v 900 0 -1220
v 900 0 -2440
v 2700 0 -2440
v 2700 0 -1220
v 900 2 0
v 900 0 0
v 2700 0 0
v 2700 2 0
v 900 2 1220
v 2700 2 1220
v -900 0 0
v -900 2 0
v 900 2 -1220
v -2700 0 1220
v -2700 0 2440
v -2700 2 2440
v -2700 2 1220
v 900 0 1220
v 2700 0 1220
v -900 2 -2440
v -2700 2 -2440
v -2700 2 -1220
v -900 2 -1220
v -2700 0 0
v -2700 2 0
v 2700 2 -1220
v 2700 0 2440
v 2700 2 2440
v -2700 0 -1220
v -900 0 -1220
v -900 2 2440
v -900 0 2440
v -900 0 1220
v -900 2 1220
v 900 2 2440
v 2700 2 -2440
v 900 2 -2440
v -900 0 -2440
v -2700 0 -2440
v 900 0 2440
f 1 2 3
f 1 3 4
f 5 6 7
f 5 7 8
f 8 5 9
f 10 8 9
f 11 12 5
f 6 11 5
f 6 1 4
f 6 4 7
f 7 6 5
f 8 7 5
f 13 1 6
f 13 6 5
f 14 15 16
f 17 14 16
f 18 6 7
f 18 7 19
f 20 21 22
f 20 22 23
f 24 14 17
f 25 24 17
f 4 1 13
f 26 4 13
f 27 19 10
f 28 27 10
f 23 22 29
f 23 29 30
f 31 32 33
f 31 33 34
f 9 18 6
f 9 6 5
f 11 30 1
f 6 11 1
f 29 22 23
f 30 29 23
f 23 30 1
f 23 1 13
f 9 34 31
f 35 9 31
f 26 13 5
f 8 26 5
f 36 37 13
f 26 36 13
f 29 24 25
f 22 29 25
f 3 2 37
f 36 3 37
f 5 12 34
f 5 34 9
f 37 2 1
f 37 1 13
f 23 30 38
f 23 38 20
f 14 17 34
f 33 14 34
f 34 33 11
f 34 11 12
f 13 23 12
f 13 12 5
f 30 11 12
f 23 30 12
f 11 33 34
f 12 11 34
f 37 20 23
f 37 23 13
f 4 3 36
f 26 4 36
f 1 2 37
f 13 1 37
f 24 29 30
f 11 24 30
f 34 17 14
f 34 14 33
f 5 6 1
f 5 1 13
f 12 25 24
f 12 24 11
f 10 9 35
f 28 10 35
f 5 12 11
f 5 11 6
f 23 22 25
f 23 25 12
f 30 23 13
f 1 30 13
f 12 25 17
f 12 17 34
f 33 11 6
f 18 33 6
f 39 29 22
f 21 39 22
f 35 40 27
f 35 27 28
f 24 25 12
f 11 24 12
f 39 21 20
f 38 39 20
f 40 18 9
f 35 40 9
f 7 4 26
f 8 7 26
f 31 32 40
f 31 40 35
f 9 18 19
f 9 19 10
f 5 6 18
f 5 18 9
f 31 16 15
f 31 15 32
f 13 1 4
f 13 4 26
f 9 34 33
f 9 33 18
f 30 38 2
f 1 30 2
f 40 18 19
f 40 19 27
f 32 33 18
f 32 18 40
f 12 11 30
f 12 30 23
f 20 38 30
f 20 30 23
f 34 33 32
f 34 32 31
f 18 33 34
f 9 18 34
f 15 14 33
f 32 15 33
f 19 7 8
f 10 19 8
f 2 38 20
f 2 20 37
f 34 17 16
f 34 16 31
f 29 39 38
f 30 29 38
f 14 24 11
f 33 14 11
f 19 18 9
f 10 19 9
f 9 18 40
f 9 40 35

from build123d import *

# Parameters (mm, degrees)
SKETCH1_W           = 5400
SKETCH1_H           = 4880
BOSS_EXTRUDE1_DEPTH = 2
SPLIT1_START        = 900
SPLIT1_OUTLINE_W    = 2
SPLIT1_OUTLINE_H    = 1220
SPLIT1_DEPTH        = 1800
SPLIT1_2_OUTLINE_W  = 2
SPLIT1_2_OUTLINE_H  = 1220
SPLIT1_2_DEPTH      = 1800
SPLIT1_3_OUTLINE_W  = 2
SPLIT1_3_OUTLINE_H  = 1220
SPLIT1_3_DEPTH      = 1800
SPLIT1_START_2      = 1220
SPLIT1_4_OUTLINE_W  = 1800
SPLIT1_4_OUTLINE_H  = 2
SPLIT1_4_DEPTH      = 1220
SPLIT1_5_OUTLINE_W  = 2
SPLIT1_5_OUTLINE_H  = 1220
SPLIT1_5_DEPTH      = 1800
SPLIT1_START_3      = -2700
SPLIT1_6_OUTLINE_W  = 2
SPLIT1_6_OUTLINE_H  = 3660
SPLIT1_6_DEPTH      = 5400
SPLIT1_7_OUTLINE_W  = 2
SPLIT1_7_OUTLINE_H  = 1220
SPLIT1_7_DEPTH      = 1800
SPLIT1_8_OUTLINE_W  = 2
SPLIT1_8_OUTLINE_H  = 1220
SPLIT1_8_DEPTH      = 1800
SPLIT1_9_OUTLINE_W  = 1800
SPLIT1_9_OUTLINE_H  = 2
SPLIT1_9_DEPTH      = 1220
SPLIT1_START_4      = -900
SPLIT1_10_OUTLINE_W = 2
SPLIT1_10_OUTLINE_H = 1220
SPLIT1_10_DEPTH     = 1800
SPLIT1_START_5      = -1220
SPLIT1_11_OUTLINE_W = 1800
SPLIT1_11_OUTLINE_H = 2
SPLIT1_11_DEPTH     = 1220
SPLIT1_12_OUTLINE_W = 1800
SPLIT1_12_OUTLINE_H = 2
SPLIT1_12_DEPTH     = 1220
SPLIT1_13_OUTLINE_W = 1800
SPLIT1_13_OUTLINE_H = 2
SPLIT1_13_DEPTH     = 1220
SPLIT1_START_6      = -2440
SPLIT1_14_OUTLINE_W = 1800
SPLIT1_14_OUTLINE_H = 2
SPLIT1_14_DEPTH     = 1220


# Read off the part's stored shape, not the designer's step: Split1
with BuildPart() as part:
    # Sketch1 → Boss-Extrude1 (new body)
    with BuildSketch(Plane(origin=(0, 0, 0), x_dir=(1, 0, 0), z_dir=(0, 1, 0))):
        Rectangle(SKETCH1_W, SKETCH1_H)
    extrude(amount=BOSS_EXTRUDE1_DEPTH)

    # Split1 6 outline → Split1 6 (cut)
    with BuildSketch(Plane.YZ.offset(SPLIT1_START_3)):
        with Locations((1, 610)):
            Rectangle(SPLIT1_6_OUTLINE_W, SPLIT1_6_OUTLINE_H)
    extrude(amount=SPLIT1_6_DEPTH, mode=Mode.SUBTRACT)

    # Split1 7 outline → Split1 7 (cut)
    with BuildSketch(Plane.YZ.offset(SPLIT1_START_3)):
        with Locations((1, -1830)):
            Rectangle(SPLIT1_7_OUTLINE_W, SPLIT1_7_OUTLINE_H)
    extrude(amount=SPLIT1_7_DEPTH, mode=Mode.SUBTRACT)

    # Split1 8 outline → Split1 8 (cut)
    with BuildSketch(Plane.YZ.offset(SPLIT1_START)):
        with Locations((1, -1830)):
            Rectangle(SPLIT1_8_OUTLINE_W, SPLIT1_8_OUTLINE_H)
    extrude(amount=SPLIT1_8_DEPTH, mode=Mode.SUBTRACT)


with BuildPart() as body_2:
    # Split1 outline → Split1 (new body)
    with BuildSketch(Plane.YZ.offset(SPLIT1_START)):
        with Locations((1, -1830)):
            Rectangle(SPLIT1_OUTLINE_W, SPLIT1_OUTLINE_H)
    extrude(amount=SPLIT1_DEPTH)


with BuildPart() as body_3:
    # Split1 2 outline → Split1 2 (new body)
    with BuildSketch(Plane.YZ.offset(SPLIT1_START)):
        with Locations((1, 1830)):
            Rectangle(SPLIT1_2_OUTLINE_W, SPLIT1_2_OUTLINE_H)
    extrude(amount=SPLIT1_2_DEPTH)


with BuildPart() as body_4:
    # Split1 3 outline → Split1 3 (new body)
    with BuildSketch(Plane.YZ.offset(SPLIT1_START)):
        with Locations((1, 610)):
            Rectangle(SPLIT1_3_OUTLINE_W, SPLIT1_3_OUTLINE_H)
    extrude(amount=SPLIT1_3_DEPTH)


with BuildPart() as body_5:
    # Split1 4 outline → Split1 4 (new body)
    with BuildSketch(Plane.XY.offset(SPLIT1_START_2)):
        with Locations((-1800, 1)):
            Rectangle(SPLIT1_4_OUTLINE_W, SPLIT1_4_OUTLINE_H)
    extrude(amount=SPLIT1_4_DEPTH)


with BuildPart() as body_6:
    # Split1 5 outline → Split1 5 (new body)
    with BuildSketch(Plane.YZ.offset(SPLIT1_START)):
        with Locations((1, -610)):
            Rectangle(SPLIT1_5_OUTLINE_W, SPLIT1_5_OUTLINE_H)
    extrude(amount=SPLIT1_5_DEPTH)


with BuildPart() as body_7:
    # Split1 9 outline → Split1 9 (new body)
    with BuildSketch(Plane.XY):
        with Locations((-1800, 1)):
            Rectangle(SPLIT1_9_OUTLINE_W, SPLIT1_9_OUTLINE_H)
    extrude(amount=SPLIT1_9_DEPTH)


with BuildPart() as body_8:
    # Split1 10 outline → Split1 10 (new body)
    with BuildSketch(Plane.YZ.offset(SPLIT1_START_4)):
        with Locations((1, 1830)):
            Rectangle(SPLIT1_10_OUTLINE_W, SPLIT1_10_OUTLINE_H)
    extrude(amount=SPLIT1_10_DEPTH)


with BuildPart() as body_9:
    # Split1 11 outline → Split1 11 (new body)
    with BuildSketch(Plane.XY.offset(SPLIT1_START_5)):
        with Locations((-1800, 1)):
            Rectangle(SPLIT1_11_OUTLINE_W, SPLIT1_11_OUTLINE_H)
    extrude(amount=SPLIT1_11_DEPTH)


with BuildPart() as body_10:
    # Split1 12 outline → Split1 12 (new body)
    with BuildSketch(Plane.XY):
        with Locations((0, 1)):
            Rectangle(SPLIT1_12_OUTLINE_W, SPLIT1_12_OUTLINE_H)
    extrude(amount=SPLIT1_12_DEPTH)


with BuildPart() as body_11:
    # Split1 13 outline → Split1 13 (new body)
    with BuildSketch(Plane.XY.offset(SPLIT1_START_5)):
        with Locations((0, 1)):
            Rectangle(SPLIT1_13_OUTLINE_W, SPLIT1_13_OUTLINE_H)
    extrude(amount=SPLIT1_13_DEPTH)


with BuildPart() as body_12:
    # Split1 14 outline → Split1 14 (new body)
    with BuildSketch(Plane.XY.offset(SPLIT1_START_6)):
        with Locations((-1800, 1)):
            Rectangle(SPLIT1_14_OUTLINE_W, SPLIT1_14_OUTLINE_H)
    extrude(amount=SPLIT1_14_DEPTH)


solid = Compound([part.part, body_2.part, body_3.part, body_4.part, body_5.part, body_6.part, body_7.part, body_8.part, body_9.part, body_10.part, body_11.part, body_12.part])
